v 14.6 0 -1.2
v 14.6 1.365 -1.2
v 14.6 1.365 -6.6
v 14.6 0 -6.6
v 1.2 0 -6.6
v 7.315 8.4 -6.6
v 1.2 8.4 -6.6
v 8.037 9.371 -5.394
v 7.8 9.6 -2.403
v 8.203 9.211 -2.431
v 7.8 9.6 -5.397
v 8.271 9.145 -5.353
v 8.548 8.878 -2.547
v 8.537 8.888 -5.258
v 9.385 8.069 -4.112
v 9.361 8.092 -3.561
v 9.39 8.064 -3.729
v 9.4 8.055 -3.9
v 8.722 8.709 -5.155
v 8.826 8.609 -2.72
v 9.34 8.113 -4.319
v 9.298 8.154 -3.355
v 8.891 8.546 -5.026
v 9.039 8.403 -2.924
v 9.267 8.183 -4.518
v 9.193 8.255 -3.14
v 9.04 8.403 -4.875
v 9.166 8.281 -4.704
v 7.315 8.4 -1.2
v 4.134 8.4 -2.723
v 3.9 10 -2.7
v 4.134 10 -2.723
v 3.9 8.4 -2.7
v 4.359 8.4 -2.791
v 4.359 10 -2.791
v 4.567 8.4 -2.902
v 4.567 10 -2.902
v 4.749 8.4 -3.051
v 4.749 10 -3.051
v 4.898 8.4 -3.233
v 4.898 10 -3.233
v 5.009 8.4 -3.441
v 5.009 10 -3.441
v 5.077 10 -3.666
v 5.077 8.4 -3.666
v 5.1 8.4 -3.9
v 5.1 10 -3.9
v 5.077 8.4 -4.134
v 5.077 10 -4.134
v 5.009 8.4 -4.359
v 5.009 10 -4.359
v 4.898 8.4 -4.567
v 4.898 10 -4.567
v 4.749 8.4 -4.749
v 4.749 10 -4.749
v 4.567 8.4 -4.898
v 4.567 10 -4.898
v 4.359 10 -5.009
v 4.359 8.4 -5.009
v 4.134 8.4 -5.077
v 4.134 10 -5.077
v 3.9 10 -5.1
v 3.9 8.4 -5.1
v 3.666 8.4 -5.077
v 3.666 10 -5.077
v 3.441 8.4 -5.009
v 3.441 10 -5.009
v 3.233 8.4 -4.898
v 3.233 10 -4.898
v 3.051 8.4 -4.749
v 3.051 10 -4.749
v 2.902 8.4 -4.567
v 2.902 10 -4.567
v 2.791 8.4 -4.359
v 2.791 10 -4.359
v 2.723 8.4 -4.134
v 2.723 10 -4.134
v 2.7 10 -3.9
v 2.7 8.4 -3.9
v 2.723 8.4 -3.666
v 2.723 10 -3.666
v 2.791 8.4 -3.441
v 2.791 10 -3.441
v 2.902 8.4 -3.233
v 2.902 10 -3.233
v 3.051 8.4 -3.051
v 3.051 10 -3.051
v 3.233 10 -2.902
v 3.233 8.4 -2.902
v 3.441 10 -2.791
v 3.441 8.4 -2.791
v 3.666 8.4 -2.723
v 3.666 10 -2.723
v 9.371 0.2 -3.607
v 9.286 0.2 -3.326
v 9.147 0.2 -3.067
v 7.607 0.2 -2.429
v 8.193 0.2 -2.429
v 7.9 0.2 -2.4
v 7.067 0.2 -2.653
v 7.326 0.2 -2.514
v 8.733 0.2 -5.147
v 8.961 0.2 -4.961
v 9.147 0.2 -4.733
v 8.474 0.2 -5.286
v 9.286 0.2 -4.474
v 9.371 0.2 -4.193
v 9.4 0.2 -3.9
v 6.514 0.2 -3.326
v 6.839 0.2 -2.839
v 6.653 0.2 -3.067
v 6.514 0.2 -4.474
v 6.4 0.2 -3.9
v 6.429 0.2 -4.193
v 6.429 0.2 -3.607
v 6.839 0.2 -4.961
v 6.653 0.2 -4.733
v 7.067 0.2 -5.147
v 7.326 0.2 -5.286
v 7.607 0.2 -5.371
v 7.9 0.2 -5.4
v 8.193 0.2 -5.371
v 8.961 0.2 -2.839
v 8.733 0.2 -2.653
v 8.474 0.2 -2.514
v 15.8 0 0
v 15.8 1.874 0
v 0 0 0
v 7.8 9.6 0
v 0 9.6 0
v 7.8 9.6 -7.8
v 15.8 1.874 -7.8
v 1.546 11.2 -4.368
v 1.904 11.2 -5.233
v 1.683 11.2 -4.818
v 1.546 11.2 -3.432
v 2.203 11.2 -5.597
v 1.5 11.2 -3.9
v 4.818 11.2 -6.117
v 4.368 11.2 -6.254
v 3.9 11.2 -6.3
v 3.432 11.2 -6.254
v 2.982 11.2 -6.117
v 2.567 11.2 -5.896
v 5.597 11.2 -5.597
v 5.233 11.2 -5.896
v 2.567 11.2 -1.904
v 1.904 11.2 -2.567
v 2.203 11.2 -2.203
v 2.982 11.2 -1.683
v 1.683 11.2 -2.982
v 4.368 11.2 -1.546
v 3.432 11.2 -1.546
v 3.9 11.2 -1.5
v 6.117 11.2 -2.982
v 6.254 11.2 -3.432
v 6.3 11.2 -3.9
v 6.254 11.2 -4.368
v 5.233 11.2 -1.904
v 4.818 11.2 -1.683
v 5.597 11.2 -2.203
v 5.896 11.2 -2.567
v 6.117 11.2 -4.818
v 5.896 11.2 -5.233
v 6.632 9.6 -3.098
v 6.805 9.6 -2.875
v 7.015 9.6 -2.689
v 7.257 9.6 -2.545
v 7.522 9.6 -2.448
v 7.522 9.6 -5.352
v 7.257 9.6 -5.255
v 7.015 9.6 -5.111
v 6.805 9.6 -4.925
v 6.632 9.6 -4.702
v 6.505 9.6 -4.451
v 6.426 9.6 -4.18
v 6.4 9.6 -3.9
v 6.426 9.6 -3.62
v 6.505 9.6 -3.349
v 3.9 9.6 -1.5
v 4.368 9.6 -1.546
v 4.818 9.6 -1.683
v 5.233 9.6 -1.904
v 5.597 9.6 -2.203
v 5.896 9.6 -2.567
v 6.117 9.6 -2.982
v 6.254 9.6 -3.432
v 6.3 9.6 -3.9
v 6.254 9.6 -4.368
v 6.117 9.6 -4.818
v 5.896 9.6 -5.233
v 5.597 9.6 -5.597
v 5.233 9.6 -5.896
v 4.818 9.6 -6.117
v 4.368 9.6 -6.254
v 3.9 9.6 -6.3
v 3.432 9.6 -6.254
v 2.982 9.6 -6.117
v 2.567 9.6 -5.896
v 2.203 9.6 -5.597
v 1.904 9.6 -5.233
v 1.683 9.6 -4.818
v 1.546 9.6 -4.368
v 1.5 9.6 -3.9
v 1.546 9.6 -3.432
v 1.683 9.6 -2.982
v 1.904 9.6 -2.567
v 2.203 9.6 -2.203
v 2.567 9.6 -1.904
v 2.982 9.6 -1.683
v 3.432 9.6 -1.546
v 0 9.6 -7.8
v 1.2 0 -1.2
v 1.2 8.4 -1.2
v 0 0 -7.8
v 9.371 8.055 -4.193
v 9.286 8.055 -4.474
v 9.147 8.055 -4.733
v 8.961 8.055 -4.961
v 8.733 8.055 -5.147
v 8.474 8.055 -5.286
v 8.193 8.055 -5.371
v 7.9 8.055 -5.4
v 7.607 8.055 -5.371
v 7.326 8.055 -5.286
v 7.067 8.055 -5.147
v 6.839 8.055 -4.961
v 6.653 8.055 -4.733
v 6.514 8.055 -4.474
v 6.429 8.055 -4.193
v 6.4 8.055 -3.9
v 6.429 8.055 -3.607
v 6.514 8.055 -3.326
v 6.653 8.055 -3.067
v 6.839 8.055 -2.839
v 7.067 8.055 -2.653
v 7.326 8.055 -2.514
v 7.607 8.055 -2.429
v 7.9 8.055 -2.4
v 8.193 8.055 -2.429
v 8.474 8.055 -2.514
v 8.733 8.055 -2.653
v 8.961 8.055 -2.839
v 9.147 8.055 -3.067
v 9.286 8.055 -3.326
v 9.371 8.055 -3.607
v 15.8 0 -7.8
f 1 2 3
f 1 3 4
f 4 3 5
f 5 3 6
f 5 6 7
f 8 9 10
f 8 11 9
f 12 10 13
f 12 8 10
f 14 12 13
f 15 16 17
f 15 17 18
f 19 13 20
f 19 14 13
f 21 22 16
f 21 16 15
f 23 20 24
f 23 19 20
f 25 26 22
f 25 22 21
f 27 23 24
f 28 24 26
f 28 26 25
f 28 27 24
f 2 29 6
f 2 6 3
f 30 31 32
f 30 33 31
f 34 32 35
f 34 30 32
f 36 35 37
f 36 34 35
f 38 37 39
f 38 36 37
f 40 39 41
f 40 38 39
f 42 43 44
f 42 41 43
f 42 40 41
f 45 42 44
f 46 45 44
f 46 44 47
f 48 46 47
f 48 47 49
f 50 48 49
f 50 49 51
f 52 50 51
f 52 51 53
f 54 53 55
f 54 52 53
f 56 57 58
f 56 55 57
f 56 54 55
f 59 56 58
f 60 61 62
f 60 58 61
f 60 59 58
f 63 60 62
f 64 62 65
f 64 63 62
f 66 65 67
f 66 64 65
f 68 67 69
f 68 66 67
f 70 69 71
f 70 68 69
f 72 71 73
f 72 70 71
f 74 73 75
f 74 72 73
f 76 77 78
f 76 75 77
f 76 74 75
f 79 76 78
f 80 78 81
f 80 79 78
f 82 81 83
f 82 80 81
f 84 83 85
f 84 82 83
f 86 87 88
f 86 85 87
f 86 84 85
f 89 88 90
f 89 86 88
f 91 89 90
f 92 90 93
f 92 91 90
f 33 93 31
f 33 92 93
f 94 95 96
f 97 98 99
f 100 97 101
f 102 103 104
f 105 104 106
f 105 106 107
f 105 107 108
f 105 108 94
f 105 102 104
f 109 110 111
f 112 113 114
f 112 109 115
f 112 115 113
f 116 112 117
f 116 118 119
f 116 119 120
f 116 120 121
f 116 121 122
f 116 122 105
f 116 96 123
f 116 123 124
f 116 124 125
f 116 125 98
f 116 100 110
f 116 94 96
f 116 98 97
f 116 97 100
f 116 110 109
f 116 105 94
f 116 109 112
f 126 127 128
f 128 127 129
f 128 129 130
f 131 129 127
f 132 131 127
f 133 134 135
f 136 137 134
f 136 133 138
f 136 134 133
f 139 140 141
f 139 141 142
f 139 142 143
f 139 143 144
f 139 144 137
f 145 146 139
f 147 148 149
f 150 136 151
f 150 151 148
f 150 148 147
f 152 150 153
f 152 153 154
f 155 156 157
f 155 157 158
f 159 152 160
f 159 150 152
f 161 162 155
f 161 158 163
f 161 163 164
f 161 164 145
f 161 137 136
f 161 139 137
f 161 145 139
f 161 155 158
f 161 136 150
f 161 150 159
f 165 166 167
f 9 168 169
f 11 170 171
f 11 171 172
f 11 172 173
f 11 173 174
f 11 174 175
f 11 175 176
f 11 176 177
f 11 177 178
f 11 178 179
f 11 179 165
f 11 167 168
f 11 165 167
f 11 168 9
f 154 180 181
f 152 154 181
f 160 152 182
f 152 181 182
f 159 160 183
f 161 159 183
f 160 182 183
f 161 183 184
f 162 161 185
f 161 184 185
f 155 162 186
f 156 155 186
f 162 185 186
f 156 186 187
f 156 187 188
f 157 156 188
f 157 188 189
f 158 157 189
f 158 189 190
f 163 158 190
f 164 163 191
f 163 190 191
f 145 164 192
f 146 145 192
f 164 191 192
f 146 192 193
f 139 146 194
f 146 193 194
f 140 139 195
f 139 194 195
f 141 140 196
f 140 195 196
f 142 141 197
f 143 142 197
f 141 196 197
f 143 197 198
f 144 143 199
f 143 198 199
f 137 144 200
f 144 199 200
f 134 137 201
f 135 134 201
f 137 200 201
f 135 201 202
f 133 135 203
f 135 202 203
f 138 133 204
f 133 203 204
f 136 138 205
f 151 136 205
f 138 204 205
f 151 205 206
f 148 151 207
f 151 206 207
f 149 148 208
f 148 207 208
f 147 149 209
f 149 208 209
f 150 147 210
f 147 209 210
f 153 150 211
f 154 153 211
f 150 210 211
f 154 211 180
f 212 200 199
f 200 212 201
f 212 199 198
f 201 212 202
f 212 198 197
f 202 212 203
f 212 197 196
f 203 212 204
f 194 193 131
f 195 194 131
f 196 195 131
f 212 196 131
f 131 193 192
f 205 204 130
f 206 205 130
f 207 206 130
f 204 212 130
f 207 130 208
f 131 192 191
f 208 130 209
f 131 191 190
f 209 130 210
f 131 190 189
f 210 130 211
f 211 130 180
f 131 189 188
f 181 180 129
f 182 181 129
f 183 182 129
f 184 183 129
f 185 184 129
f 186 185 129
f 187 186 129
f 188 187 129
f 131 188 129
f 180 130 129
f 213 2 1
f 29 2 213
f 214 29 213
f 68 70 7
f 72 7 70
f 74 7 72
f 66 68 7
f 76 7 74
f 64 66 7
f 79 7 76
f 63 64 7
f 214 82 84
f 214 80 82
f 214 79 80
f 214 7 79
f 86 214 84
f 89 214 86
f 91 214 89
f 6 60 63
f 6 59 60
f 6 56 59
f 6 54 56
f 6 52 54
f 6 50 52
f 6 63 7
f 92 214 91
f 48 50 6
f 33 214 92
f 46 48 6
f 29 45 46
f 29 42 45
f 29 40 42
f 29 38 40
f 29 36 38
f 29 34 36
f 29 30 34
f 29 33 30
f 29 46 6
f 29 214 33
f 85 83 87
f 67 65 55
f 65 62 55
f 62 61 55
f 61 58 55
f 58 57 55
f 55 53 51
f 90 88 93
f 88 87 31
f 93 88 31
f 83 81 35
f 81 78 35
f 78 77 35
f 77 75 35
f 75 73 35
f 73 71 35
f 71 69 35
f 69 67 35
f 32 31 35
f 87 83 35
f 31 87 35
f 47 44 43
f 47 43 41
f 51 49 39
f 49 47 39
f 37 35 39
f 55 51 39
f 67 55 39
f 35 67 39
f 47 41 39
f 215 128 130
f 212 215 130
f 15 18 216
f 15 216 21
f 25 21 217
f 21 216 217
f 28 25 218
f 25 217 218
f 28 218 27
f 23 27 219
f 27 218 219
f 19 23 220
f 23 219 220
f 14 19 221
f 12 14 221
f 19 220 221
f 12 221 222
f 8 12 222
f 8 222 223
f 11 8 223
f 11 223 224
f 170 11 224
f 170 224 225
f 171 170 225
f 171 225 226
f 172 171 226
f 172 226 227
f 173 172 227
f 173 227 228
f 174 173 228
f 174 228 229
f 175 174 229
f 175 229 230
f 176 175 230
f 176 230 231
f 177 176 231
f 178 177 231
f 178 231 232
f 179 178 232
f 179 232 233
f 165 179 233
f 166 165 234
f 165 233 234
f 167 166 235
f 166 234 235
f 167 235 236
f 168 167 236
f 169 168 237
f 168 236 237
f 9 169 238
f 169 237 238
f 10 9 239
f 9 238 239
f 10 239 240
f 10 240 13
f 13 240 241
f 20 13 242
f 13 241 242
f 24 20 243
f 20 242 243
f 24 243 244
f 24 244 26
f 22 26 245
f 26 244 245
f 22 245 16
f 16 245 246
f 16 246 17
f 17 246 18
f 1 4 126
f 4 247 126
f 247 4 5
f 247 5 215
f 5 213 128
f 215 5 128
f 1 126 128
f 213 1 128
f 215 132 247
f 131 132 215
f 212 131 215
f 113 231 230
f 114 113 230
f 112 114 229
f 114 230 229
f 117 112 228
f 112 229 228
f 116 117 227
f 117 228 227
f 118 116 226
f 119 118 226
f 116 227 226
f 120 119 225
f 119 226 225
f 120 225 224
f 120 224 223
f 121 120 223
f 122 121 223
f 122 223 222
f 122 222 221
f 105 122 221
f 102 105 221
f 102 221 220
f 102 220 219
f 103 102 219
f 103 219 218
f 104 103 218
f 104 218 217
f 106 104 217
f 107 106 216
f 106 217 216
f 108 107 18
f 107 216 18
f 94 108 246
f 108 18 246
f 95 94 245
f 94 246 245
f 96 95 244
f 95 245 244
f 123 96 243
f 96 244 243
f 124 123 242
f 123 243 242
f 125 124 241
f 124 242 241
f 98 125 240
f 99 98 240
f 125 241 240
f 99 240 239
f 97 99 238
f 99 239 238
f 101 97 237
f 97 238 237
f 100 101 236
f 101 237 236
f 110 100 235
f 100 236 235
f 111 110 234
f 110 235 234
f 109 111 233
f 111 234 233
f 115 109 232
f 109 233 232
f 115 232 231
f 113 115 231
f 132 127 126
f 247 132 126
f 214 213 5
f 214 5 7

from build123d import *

# Parameters (mm, degrees)
BOSS_EXTRUDE1_DEPTH       = 7.8
BOSS_EXTRUDE2_START       = -7.85489796
BOSS_EXTRUDE2_OUTLINE_R   = 1.5
BOSS_EXTRUDE2_DEPTH       = 7.85489796
BOSS_EXTRUDE2_START_2     = 8.05489796
BOSS_EXTRUDE2_2_OUTLINE_R = 1.5
BOSS_EXTRUDE2_2_DEPTH     = 1.54510204
BOSS_EXTRUDE2_START_3     = 12.323997373
BOSS_EXTRUDE2_3_OUTLINE_W = 6
BOSS_EXTRUDE2_3_OUTLINE_H = 6
BOSS_EXTRUDE2_3_DEPTH     = 1.676002627
SKETCH4_R                 = 2.4
BOSS_EXTRUDE3_DEPTH       = 1.6
SHELL1_T                  = -1.2


with BuildPart() as part:
    # Sketch1 → Boss-Extrude1 (new body)
    with BuildSketch(Plane.XY):
        Polygon((0, 9.6), (7.8, 9.6), (15.8, 1.874489802), (15.8, 0), (0, 0), align=None)
    extrude(amount=-BOSS_EXTRUDE1_DEPTH)

    # Sketch4 → Boss-Extrude3 (add)
    with BuildSketch(Plane(origin=(0, 9.6, 0), x_dir=(1, 0, 0), z_dir=(0, 1, 0))):
        with Locations(Location((3.9, 3.9, 0), (0, 0, 270))):
            Circle(SKETCH4_R)
    extrude(amount=BOSS_EXTRUDE3_DEPTH)

    # Shell1
    shell1_openings = [part.faces().sort_by_distance(p)[0] for p in [
        (7.9, 0, -3.9),
    ]]
    offset(amount=SHELL1_T, openings=shell1_openings, kind=Kind.INTERSECTION)


with BuildPart() as body_2:
    # Boss-Extrude2: read off the stored shape, not the designer's step
    # Boss-Extrude2 outline → Boss-Extrude2 (new body)
    with BuildSketch(Plane(origin=(0, 0.2, 0), x_dir=(-1, 0, 0), z_dir=(0, -1, 0)).offset(BOSS_EXTRUDE2_START)):
        with Locations((-7.9, 3.9)):
            Circle(BOSS_EXTRUDE2_OUTLINE_R)
    extrude(amount=BOSS_EXTRUDE2_DEPTH)

    # Boss-Extrude2 2 outline → Boss-Extrude2 2 (add)
    with BuildSketch(Plane(origin=(0, 0, 0), x_dir=(1, 0, 0), z_dir=(0, 1, 0)).offset(BOSS_EXTRUDE2_START_2)):
        with Locations((7.9, 3.9)):
            Circle(BOSS_EXTRUDE2_2_OUTLINE_R)
    extrude(amount=BOSS_EXTRUDE2_2_DEPTH)

    # Boss-Extrude2 3 outline → Boss-Extrude2 3 (cut)
    with BuildSketch(Plane(origin=(0, 0, 0), x_dir=(0.7193398003386496, -0.6946583704589989, 0), z_dir=(0.6946583704589988, 0.7193398003386497, 0)).offset(BOSS_EXTRUDE2_START_3)):
        with Locations((0, 4)):
            Rectangle(BOSS_EXTRUDE2_3_OUTLINE_W, BOSS_EXTRUDE2_3_OUTLINE_H)
    extrude(amount=BOSS_EXTRUDE2_3_DEPTH, mode=Mode.SUBTRACT)


solid = Compound([part.part, body_2.part])
